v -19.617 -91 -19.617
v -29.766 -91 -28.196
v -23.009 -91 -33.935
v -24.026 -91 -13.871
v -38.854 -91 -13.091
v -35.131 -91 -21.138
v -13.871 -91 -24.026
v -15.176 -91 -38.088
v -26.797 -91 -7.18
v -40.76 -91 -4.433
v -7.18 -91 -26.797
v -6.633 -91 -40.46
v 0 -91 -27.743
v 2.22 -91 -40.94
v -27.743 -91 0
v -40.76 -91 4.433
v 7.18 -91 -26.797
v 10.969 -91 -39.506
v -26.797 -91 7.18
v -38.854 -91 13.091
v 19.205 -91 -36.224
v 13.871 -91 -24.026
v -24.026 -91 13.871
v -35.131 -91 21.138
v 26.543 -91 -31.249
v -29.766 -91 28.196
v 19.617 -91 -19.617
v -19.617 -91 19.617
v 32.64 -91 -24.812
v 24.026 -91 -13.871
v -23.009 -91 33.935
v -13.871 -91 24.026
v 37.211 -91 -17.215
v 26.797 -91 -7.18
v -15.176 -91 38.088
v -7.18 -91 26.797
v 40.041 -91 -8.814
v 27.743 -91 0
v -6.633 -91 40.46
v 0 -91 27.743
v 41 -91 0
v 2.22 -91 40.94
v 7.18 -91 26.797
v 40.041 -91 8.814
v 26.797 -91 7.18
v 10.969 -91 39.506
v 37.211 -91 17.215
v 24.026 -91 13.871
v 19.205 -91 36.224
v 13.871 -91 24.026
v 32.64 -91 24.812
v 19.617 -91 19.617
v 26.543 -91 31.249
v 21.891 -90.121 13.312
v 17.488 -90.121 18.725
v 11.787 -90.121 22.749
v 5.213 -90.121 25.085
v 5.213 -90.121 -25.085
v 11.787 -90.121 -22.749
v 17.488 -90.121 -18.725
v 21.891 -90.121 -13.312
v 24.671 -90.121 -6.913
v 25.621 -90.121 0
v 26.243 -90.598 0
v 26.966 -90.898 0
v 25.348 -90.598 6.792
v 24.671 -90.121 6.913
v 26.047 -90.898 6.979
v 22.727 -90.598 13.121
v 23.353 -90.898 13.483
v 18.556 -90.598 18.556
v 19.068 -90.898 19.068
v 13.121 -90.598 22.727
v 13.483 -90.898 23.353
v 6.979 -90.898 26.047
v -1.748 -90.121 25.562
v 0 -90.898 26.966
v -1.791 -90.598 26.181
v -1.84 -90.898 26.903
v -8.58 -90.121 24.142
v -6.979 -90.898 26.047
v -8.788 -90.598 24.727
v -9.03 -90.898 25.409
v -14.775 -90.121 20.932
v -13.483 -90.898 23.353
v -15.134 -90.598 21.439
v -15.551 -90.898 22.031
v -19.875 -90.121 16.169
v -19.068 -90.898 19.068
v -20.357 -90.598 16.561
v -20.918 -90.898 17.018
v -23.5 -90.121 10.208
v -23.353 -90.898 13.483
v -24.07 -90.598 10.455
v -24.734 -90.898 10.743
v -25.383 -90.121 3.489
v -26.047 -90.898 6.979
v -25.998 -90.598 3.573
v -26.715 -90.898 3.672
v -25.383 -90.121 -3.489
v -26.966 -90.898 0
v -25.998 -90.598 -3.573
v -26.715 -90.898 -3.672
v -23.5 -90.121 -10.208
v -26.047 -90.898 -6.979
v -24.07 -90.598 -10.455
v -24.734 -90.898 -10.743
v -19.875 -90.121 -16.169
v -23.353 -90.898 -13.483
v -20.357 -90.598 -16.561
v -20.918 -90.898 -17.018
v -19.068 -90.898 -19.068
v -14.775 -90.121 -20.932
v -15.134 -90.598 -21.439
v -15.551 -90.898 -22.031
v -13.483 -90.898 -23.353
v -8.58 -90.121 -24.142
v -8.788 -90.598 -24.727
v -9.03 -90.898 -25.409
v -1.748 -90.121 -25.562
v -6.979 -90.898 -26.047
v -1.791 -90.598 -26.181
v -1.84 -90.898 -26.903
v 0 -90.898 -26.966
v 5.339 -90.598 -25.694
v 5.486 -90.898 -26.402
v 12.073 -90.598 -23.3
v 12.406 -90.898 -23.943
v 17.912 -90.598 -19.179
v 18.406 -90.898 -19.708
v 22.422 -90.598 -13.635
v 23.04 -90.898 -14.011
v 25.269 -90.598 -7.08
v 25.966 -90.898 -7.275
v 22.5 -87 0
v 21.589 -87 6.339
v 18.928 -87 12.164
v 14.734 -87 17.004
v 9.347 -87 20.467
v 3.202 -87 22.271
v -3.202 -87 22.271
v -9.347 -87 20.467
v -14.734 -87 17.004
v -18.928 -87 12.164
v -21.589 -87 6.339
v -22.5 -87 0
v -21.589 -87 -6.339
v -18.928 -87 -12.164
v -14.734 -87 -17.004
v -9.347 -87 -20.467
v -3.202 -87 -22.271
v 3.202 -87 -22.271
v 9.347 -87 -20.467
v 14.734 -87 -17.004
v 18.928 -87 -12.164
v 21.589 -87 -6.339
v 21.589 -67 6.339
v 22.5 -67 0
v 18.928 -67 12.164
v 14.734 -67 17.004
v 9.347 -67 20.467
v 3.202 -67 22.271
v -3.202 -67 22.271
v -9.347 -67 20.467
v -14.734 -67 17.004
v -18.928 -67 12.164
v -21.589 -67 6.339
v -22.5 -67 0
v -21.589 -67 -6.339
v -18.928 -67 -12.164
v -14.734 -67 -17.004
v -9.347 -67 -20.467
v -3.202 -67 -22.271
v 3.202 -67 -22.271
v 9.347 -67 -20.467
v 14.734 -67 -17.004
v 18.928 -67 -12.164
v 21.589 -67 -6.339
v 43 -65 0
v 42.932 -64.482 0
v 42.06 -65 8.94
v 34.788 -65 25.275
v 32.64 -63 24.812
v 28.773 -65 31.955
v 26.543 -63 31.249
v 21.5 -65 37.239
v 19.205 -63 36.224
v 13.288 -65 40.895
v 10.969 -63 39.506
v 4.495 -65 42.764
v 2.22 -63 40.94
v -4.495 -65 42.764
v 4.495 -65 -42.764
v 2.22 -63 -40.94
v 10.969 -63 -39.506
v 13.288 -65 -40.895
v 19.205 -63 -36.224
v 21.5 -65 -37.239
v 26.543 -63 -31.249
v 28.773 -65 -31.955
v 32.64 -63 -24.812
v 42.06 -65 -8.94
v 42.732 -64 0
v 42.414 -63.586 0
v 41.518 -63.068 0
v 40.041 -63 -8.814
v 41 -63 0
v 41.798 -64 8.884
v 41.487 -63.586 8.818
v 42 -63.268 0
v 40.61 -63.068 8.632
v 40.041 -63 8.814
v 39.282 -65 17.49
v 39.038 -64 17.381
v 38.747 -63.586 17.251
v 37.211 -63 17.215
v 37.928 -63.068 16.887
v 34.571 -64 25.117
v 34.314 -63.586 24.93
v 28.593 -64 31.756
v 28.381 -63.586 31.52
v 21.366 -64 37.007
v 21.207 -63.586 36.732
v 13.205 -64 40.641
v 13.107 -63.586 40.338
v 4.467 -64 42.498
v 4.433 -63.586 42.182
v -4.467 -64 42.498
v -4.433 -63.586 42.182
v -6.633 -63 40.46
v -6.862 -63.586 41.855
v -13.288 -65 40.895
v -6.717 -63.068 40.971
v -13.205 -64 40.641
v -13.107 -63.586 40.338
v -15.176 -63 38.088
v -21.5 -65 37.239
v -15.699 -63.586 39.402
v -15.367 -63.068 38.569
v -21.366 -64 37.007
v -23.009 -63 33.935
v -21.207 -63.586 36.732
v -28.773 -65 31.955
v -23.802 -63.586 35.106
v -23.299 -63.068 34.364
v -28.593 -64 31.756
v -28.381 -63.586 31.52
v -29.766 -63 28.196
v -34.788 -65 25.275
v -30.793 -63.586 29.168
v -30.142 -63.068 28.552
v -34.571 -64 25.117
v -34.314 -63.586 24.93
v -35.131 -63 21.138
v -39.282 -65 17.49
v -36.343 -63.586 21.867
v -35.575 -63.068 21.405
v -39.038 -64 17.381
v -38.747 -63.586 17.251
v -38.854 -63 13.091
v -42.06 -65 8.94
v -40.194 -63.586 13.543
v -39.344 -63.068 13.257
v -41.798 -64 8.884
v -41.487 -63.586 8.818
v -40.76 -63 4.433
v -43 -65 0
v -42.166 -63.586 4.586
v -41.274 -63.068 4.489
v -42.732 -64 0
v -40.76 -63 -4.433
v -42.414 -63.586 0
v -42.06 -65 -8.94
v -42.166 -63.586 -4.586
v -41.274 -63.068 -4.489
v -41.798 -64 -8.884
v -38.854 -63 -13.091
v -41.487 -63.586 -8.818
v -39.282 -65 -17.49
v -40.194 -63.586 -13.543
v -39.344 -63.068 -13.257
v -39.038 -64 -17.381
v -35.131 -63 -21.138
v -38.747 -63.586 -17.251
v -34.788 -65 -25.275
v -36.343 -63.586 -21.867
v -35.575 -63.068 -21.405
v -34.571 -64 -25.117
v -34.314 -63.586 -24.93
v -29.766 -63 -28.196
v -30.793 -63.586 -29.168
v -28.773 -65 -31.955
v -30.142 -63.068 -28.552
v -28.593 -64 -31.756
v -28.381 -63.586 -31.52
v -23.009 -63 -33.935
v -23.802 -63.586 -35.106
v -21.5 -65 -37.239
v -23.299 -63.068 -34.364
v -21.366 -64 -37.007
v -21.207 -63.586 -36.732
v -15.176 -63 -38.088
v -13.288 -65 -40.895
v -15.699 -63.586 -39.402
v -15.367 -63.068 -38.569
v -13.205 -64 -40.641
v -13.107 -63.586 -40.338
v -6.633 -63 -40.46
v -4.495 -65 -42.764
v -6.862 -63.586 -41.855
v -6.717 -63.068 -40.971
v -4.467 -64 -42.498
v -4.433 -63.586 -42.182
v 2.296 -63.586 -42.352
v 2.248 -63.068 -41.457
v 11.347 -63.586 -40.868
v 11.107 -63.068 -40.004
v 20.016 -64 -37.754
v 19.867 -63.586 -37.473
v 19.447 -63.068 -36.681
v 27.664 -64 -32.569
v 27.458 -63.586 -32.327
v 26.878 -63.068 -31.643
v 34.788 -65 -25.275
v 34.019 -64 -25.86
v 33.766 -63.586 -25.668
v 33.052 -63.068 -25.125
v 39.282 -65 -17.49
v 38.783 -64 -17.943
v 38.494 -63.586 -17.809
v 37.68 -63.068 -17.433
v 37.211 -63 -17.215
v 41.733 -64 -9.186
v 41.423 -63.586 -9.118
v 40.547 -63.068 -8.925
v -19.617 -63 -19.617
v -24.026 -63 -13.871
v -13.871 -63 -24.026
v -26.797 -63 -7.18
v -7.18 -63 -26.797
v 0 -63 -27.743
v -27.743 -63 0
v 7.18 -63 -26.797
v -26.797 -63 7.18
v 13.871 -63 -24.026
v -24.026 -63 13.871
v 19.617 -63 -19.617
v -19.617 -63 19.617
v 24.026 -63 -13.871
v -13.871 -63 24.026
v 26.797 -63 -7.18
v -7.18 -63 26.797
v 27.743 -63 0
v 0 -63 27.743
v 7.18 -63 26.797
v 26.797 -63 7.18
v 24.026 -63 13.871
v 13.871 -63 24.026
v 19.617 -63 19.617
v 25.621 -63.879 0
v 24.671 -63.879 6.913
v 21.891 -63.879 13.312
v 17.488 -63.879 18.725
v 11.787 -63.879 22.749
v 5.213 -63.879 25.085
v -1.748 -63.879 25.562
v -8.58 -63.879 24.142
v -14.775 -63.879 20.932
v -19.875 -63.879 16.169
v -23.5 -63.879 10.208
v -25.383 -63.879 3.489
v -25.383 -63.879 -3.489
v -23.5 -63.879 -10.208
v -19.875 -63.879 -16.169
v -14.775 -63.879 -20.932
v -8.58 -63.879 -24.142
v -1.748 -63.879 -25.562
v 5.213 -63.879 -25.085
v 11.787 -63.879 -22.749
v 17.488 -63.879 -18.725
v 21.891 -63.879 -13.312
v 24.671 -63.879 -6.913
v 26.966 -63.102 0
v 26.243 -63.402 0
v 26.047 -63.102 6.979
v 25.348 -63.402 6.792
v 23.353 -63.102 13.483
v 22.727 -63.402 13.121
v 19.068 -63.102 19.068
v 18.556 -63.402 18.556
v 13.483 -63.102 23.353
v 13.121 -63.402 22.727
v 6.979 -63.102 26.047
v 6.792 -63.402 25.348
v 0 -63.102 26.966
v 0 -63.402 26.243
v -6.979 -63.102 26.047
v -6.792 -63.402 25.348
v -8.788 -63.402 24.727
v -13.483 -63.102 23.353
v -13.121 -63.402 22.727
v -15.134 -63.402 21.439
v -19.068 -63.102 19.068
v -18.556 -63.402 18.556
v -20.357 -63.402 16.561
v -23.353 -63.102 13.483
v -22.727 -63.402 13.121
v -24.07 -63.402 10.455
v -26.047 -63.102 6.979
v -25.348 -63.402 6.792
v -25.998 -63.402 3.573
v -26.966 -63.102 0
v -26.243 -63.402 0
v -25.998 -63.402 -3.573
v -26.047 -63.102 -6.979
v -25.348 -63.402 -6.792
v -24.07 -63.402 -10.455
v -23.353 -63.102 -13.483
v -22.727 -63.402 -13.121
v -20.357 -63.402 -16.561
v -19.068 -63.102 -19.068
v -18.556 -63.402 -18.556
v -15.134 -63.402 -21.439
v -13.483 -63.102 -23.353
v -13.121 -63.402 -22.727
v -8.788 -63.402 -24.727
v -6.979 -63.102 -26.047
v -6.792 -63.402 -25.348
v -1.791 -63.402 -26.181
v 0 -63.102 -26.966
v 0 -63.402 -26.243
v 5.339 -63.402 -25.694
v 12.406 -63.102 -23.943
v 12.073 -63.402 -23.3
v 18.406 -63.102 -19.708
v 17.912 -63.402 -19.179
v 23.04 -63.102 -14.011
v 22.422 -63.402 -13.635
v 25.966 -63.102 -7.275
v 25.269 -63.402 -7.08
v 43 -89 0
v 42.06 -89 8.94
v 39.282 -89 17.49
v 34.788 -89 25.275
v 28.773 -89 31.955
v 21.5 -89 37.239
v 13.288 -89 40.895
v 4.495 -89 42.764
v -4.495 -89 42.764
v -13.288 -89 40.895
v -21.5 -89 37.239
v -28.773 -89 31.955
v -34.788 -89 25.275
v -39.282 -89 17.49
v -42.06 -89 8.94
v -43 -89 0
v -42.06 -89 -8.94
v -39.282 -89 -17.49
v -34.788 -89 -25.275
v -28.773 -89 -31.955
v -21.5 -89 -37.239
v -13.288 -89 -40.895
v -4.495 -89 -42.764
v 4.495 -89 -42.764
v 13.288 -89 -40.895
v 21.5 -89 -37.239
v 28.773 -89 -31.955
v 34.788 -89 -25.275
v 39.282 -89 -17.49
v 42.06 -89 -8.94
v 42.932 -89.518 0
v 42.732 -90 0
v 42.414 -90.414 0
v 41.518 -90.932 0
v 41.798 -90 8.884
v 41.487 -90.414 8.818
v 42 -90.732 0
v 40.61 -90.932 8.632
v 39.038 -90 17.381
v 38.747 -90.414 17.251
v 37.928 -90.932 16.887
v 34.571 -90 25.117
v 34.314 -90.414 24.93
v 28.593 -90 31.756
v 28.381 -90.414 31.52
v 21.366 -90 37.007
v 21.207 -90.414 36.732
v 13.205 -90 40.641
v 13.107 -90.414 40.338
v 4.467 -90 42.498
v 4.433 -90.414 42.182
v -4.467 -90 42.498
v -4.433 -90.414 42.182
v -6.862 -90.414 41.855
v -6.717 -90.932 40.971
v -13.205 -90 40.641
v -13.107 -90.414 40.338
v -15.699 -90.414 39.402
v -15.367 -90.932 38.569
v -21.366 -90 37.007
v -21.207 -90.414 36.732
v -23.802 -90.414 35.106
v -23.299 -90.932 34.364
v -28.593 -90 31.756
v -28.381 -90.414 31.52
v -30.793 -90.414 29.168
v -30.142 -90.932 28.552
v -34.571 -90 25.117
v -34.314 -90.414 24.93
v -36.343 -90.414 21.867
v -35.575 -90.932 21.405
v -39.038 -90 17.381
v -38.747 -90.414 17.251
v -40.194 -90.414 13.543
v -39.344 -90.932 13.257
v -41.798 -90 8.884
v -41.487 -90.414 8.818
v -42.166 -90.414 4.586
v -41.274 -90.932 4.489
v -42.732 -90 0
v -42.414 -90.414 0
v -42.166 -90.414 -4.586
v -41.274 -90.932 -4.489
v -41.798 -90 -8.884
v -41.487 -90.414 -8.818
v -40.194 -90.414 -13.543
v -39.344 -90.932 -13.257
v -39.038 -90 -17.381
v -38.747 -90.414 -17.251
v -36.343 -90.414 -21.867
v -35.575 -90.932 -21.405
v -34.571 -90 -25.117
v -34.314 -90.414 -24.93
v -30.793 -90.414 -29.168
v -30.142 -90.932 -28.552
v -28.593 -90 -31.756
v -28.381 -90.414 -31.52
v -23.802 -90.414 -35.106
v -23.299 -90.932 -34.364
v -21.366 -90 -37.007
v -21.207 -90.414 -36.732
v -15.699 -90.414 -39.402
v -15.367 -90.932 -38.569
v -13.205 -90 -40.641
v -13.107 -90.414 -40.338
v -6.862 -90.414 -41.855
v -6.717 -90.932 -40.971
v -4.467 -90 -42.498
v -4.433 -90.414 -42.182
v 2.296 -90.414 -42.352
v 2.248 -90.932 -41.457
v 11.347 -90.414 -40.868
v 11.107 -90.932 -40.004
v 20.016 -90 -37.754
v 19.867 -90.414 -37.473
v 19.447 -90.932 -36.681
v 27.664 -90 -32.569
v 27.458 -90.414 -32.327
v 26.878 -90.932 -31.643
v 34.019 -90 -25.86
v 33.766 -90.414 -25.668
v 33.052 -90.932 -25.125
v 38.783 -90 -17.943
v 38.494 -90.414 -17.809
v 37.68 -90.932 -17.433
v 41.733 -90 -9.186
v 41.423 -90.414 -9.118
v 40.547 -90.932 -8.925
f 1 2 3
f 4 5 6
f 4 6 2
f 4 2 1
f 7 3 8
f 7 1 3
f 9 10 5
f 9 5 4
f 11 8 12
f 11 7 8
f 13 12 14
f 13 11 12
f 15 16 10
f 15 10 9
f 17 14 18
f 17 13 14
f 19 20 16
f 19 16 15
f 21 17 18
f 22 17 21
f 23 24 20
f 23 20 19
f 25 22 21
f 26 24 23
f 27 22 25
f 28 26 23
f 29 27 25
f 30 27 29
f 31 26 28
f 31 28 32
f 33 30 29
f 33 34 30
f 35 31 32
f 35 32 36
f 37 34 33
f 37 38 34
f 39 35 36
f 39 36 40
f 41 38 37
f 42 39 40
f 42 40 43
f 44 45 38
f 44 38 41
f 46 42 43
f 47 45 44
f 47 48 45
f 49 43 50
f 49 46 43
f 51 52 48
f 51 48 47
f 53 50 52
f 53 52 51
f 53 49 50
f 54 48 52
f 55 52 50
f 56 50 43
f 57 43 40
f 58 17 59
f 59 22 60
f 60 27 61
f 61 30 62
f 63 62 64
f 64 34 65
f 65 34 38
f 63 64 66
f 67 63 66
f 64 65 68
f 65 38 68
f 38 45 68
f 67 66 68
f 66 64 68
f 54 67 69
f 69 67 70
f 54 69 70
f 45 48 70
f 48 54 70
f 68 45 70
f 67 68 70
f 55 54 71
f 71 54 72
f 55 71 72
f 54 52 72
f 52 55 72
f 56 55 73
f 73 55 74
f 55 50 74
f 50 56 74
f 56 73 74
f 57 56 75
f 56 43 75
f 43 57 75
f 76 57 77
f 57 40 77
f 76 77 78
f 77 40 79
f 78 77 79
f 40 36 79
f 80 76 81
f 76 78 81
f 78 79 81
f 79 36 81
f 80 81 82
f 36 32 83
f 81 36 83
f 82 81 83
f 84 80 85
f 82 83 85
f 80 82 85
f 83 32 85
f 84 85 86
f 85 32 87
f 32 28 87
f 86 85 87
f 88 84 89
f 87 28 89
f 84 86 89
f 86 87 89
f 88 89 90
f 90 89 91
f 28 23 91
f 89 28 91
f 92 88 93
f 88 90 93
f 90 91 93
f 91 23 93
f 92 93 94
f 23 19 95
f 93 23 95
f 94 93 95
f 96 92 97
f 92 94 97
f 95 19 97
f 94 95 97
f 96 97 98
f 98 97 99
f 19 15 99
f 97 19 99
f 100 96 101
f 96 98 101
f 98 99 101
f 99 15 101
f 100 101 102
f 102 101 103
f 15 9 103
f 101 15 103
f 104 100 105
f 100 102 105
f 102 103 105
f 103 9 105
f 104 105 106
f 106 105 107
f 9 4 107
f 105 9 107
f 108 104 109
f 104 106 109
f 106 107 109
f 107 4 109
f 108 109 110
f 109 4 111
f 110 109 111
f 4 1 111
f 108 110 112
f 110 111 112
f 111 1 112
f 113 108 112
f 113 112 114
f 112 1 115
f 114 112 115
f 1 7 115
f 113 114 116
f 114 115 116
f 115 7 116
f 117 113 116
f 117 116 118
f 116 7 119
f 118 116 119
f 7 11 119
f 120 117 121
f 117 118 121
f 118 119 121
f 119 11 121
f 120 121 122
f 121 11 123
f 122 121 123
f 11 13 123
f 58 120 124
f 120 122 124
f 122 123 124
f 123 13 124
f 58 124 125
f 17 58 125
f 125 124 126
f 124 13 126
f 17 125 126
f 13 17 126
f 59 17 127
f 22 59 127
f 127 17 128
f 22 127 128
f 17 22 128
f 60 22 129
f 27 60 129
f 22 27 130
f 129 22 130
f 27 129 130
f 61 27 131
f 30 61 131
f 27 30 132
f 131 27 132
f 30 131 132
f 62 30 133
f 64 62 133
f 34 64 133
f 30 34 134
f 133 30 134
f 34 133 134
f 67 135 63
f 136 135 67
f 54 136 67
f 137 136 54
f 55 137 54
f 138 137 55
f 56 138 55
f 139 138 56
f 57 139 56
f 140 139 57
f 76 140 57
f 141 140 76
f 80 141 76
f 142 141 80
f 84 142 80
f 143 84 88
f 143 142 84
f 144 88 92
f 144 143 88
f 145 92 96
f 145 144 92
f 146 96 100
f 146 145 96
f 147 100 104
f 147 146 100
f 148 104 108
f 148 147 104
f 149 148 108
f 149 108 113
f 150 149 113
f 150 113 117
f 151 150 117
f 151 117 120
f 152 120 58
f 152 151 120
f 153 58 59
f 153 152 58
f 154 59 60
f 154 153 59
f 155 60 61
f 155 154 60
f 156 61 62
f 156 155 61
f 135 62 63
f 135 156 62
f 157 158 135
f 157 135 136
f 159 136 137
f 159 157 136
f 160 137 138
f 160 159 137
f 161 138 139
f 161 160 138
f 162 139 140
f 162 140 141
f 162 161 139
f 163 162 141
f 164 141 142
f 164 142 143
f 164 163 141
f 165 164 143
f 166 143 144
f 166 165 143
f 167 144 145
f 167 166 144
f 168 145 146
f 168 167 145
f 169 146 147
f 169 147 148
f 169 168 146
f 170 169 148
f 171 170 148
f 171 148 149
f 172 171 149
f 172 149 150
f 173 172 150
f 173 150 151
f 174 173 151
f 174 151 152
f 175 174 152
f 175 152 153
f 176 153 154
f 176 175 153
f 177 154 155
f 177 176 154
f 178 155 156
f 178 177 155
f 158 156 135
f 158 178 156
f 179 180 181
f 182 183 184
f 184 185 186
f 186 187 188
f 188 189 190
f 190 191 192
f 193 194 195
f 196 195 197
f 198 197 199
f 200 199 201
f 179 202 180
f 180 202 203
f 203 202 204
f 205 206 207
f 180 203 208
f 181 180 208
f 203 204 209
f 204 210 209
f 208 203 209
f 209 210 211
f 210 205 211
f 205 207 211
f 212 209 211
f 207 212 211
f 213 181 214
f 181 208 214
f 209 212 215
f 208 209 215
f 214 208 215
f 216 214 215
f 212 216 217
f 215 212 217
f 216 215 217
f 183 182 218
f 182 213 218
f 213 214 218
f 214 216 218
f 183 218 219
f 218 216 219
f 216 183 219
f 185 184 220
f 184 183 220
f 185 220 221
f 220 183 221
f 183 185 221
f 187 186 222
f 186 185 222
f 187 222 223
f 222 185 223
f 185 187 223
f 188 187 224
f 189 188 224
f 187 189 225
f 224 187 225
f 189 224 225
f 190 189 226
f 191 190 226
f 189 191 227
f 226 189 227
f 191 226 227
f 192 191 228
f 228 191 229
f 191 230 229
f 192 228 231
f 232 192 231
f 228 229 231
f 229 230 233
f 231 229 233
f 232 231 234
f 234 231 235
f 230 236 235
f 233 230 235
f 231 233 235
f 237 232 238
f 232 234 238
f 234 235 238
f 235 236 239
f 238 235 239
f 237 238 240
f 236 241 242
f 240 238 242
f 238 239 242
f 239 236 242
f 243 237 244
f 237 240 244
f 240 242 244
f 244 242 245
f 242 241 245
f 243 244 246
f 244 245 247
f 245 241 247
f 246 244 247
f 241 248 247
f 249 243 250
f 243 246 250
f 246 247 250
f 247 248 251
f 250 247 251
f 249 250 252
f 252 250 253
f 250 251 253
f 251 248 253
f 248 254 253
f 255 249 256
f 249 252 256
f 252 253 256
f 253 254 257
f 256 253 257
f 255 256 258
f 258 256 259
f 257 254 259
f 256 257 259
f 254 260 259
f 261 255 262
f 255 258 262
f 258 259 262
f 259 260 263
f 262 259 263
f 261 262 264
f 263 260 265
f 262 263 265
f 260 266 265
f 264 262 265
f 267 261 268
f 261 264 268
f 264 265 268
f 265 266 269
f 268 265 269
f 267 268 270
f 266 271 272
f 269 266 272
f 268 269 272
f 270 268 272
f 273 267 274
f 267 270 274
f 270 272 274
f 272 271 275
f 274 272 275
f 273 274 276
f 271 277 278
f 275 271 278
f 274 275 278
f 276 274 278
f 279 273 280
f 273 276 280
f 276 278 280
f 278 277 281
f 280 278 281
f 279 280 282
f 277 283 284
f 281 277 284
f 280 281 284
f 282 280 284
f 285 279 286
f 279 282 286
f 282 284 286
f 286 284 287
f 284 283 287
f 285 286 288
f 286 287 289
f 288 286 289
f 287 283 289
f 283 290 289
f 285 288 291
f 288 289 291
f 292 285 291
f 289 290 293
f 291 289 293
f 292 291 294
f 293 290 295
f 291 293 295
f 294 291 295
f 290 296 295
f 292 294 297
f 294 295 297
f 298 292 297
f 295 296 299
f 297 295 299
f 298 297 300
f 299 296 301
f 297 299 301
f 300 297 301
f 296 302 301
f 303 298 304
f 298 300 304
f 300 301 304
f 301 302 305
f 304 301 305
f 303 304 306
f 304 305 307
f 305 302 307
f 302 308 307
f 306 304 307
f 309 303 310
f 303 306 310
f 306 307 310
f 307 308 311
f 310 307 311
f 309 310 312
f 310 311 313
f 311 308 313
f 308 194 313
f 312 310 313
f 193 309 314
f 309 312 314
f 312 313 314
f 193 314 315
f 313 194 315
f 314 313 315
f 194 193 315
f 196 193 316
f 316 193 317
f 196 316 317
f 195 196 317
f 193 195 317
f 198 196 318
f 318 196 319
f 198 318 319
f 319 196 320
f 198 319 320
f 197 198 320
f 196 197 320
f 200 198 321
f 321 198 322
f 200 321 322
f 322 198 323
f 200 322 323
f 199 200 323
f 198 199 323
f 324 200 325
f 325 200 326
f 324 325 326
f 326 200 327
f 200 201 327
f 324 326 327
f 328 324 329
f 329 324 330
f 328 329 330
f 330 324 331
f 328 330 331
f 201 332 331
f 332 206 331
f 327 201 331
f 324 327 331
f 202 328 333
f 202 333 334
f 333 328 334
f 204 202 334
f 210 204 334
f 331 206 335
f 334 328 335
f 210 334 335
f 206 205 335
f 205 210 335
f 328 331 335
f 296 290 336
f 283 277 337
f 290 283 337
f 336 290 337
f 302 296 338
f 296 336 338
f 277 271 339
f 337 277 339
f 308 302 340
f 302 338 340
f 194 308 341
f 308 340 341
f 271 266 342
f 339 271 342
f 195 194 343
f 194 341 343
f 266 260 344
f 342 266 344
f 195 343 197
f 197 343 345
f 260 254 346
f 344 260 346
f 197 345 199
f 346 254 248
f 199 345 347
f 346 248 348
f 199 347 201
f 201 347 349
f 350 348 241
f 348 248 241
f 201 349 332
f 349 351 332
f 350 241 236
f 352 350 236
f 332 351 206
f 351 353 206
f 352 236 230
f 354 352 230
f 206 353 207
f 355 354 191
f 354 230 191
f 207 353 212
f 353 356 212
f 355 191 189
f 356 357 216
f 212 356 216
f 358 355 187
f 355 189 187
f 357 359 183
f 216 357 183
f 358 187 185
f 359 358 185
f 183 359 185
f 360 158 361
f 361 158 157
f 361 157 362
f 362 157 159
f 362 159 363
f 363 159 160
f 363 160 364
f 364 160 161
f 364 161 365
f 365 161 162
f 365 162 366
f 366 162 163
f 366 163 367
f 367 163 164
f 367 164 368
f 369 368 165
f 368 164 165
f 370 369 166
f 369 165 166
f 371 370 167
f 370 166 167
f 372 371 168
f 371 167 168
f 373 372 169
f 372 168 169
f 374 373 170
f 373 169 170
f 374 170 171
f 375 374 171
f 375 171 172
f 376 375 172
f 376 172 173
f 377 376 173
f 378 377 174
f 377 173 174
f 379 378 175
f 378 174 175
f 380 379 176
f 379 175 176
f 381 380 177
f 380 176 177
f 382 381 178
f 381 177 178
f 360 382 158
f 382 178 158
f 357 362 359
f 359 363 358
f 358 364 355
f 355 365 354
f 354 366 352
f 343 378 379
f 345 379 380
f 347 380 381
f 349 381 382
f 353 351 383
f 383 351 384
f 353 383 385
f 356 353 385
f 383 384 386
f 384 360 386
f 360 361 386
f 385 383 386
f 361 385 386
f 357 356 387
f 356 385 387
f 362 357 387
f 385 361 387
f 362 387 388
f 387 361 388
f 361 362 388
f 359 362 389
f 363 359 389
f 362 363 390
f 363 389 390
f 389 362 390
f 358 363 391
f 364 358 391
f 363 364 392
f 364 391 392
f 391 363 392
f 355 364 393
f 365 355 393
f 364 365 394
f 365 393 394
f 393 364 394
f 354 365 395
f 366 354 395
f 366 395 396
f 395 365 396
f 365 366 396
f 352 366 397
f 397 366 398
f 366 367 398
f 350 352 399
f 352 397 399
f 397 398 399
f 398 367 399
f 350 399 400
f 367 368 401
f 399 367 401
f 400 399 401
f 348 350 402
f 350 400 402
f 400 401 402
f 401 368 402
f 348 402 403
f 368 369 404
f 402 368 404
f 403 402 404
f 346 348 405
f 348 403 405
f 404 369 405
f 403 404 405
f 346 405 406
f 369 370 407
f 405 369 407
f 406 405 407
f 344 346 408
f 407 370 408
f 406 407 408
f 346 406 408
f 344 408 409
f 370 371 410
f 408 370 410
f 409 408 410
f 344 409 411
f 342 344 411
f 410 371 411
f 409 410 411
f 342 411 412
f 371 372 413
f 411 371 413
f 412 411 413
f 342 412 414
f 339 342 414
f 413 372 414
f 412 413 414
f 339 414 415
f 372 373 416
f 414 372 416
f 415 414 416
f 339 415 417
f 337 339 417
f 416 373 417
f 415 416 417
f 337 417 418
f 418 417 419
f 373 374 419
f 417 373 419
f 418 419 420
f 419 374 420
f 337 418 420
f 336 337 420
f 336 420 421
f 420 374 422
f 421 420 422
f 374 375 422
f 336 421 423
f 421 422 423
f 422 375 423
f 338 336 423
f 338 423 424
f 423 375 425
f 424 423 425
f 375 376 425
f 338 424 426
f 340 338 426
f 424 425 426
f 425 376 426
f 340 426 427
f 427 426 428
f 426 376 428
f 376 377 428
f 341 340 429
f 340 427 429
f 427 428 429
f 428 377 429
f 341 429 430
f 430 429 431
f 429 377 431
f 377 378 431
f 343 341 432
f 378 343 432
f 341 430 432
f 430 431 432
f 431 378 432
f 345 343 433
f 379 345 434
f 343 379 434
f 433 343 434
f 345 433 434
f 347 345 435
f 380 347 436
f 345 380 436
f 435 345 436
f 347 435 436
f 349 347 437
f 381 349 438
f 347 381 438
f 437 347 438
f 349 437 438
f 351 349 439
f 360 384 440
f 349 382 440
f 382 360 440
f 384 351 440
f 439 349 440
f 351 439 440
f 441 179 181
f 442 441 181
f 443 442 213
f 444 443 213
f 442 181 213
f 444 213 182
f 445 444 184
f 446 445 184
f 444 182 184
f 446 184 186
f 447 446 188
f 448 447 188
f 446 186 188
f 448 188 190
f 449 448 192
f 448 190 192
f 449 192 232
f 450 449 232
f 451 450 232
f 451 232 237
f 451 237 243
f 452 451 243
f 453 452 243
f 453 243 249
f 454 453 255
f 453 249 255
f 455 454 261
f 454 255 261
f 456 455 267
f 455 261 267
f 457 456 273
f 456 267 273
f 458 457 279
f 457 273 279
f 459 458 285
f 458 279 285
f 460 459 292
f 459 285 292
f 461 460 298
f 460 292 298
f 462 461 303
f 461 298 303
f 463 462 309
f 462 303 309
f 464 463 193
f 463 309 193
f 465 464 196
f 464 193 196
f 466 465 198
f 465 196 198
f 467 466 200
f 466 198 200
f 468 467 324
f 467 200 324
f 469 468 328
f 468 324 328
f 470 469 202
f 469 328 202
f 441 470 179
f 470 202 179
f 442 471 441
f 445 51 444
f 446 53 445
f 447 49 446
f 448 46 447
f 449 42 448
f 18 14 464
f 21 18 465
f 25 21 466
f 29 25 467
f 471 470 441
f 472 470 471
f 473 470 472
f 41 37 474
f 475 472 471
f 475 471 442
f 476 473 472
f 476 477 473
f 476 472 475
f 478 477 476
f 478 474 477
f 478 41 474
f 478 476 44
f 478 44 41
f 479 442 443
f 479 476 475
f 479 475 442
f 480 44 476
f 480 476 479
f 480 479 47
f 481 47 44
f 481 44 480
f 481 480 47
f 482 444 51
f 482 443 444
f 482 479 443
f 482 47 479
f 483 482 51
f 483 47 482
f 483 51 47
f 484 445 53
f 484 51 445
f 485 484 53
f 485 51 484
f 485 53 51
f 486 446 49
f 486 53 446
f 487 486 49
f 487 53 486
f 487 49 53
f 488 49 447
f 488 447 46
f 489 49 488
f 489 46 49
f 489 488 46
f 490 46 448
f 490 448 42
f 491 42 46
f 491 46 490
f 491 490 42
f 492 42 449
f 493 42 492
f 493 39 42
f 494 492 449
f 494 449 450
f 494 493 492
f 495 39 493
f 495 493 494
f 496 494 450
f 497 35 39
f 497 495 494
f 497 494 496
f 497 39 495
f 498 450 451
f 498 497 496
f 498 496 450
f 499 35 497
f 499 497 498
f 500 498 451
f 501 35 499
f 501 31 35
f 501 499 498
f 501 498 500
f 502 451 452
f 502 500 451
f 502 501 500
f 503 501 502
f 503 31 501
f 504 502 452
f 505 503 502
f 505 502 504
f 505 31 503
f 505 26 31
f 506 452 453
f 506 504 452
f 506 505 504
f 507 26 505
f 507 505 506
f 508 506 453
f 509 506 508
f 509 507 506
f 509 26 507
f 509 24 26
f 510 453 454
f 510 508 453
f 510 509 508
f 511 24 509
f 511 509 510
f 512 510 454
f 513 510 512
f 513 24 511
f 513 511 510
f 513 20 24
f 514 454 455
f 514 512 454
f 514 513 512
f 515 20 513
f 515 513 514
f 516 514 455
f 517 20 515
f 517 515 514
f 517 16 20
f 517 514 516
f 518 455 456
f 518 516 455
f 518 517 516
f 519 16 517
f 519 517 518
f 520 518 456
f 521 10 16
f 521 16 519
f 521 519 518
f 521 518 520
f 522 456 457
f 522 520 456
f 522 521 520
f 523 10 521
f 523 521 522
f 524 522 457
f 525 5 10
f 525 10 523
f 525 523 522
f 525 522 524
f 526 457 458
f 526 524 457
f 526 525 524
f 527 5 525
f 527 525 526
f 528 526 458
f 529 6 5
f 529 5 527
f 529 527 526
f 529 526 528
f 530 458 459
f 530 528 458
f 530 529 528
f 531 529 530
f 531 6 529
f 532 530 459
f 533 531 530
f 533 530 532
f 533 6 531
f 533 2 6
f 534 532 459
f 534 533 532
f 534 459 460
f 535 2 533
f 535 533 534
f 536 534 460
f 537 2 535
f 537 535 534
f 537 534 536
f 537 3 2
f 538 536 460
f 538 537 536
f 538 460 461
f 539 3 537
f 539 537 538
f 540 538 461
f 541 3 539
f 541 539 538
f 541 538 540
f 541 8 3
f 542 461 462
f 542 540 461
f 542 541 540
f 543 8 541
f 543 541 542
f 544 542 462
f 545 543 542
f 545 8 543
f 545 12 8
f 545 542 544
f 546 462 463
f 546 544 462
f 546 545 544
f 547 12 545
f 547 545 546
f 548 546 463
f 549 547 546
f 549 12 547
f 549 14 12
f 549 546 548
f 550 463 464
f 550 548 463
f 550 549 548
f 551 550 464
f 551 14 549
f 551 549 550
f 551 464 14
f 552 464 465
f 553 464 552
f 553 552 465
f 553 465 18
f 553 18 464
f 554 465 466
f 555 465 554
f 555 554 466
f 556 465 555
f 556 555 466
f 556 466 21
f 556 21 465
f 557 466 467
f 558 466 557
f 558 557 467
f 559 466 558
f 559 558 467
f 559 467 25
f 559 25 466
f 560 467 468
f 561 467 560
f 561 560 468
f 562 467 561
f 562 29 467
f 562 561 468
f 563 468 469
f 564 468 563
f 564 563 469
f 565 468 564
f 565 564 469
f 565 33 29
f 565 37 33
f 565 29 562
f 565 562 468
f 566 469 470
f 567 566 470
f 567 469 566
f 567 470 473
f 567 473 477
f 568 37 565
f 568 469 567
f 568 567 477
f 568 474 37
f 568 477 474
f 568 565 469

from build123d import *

# Parameters (mm, degrees)
CYLINDER050_R     = 22.5
CYLINDER050_DEPTH = 28
CYLINDER049_R     = 43
CYLINDER049_DEPTH = 28
FILLET_R          = 2
CHAMFER_SIZE      = 4
FILLET010_R       = 3


with BuildPart() as cylinder050:
    # Cylinder050 → Cylinder050 (new body)
    with BuildSketch(Plane.XZ):
        Circle(CYLINDER050_R)
    extrude(amount=CYLINDER050_DEPTH)


with BuildPart() as wheel_wide_left:
    # Cylinder049 → Cylinder049 (new body)
    with BuildSketch(Plane.XZ):
        Circle(CYLINDER049_R)
    extrude(amount=CYLINDER049_DEPTH)

    # Cut019: cut Cylinder050
    add(cylinder050.part, mode=Mode.SUBTRACT)

    # Fillet
    fillet_edges = [wheel_wide_left.edges().sort_by_distance(p)[0] for p in [
        (-43, -28, 0),
        (-43, 0, 0),
    ]]
    fillet(fillet_edges, radius=FILLET_R)

    # Chamfer
    chamfer_edges = [wheel_wide_left.edges().sort_by_distance(p)[0] for p in [
        (-22.5, 0, 0),
        (-22.5, -28, 0),
    ]]
    chamfer(chamfer_edges, length=CHAMFER_SIZE)

    # Fillet010
    fillet010_edges = [wheel_wide_left.edges().sort_by_distance(p)[0] for p in [
        (-26.5, 0, 0),
        (-26.5, -28, 0),
    ]]
    fillet(fillet010_edges, radius=FILLET010_R)


with BuildPart() as wheel_wide_left_1:
    # Fillet010 placement: moved
    add(wheel_wide_left.part.moved(Location((0, -63, 0))))


solid = wheel_wide_left_1.part
